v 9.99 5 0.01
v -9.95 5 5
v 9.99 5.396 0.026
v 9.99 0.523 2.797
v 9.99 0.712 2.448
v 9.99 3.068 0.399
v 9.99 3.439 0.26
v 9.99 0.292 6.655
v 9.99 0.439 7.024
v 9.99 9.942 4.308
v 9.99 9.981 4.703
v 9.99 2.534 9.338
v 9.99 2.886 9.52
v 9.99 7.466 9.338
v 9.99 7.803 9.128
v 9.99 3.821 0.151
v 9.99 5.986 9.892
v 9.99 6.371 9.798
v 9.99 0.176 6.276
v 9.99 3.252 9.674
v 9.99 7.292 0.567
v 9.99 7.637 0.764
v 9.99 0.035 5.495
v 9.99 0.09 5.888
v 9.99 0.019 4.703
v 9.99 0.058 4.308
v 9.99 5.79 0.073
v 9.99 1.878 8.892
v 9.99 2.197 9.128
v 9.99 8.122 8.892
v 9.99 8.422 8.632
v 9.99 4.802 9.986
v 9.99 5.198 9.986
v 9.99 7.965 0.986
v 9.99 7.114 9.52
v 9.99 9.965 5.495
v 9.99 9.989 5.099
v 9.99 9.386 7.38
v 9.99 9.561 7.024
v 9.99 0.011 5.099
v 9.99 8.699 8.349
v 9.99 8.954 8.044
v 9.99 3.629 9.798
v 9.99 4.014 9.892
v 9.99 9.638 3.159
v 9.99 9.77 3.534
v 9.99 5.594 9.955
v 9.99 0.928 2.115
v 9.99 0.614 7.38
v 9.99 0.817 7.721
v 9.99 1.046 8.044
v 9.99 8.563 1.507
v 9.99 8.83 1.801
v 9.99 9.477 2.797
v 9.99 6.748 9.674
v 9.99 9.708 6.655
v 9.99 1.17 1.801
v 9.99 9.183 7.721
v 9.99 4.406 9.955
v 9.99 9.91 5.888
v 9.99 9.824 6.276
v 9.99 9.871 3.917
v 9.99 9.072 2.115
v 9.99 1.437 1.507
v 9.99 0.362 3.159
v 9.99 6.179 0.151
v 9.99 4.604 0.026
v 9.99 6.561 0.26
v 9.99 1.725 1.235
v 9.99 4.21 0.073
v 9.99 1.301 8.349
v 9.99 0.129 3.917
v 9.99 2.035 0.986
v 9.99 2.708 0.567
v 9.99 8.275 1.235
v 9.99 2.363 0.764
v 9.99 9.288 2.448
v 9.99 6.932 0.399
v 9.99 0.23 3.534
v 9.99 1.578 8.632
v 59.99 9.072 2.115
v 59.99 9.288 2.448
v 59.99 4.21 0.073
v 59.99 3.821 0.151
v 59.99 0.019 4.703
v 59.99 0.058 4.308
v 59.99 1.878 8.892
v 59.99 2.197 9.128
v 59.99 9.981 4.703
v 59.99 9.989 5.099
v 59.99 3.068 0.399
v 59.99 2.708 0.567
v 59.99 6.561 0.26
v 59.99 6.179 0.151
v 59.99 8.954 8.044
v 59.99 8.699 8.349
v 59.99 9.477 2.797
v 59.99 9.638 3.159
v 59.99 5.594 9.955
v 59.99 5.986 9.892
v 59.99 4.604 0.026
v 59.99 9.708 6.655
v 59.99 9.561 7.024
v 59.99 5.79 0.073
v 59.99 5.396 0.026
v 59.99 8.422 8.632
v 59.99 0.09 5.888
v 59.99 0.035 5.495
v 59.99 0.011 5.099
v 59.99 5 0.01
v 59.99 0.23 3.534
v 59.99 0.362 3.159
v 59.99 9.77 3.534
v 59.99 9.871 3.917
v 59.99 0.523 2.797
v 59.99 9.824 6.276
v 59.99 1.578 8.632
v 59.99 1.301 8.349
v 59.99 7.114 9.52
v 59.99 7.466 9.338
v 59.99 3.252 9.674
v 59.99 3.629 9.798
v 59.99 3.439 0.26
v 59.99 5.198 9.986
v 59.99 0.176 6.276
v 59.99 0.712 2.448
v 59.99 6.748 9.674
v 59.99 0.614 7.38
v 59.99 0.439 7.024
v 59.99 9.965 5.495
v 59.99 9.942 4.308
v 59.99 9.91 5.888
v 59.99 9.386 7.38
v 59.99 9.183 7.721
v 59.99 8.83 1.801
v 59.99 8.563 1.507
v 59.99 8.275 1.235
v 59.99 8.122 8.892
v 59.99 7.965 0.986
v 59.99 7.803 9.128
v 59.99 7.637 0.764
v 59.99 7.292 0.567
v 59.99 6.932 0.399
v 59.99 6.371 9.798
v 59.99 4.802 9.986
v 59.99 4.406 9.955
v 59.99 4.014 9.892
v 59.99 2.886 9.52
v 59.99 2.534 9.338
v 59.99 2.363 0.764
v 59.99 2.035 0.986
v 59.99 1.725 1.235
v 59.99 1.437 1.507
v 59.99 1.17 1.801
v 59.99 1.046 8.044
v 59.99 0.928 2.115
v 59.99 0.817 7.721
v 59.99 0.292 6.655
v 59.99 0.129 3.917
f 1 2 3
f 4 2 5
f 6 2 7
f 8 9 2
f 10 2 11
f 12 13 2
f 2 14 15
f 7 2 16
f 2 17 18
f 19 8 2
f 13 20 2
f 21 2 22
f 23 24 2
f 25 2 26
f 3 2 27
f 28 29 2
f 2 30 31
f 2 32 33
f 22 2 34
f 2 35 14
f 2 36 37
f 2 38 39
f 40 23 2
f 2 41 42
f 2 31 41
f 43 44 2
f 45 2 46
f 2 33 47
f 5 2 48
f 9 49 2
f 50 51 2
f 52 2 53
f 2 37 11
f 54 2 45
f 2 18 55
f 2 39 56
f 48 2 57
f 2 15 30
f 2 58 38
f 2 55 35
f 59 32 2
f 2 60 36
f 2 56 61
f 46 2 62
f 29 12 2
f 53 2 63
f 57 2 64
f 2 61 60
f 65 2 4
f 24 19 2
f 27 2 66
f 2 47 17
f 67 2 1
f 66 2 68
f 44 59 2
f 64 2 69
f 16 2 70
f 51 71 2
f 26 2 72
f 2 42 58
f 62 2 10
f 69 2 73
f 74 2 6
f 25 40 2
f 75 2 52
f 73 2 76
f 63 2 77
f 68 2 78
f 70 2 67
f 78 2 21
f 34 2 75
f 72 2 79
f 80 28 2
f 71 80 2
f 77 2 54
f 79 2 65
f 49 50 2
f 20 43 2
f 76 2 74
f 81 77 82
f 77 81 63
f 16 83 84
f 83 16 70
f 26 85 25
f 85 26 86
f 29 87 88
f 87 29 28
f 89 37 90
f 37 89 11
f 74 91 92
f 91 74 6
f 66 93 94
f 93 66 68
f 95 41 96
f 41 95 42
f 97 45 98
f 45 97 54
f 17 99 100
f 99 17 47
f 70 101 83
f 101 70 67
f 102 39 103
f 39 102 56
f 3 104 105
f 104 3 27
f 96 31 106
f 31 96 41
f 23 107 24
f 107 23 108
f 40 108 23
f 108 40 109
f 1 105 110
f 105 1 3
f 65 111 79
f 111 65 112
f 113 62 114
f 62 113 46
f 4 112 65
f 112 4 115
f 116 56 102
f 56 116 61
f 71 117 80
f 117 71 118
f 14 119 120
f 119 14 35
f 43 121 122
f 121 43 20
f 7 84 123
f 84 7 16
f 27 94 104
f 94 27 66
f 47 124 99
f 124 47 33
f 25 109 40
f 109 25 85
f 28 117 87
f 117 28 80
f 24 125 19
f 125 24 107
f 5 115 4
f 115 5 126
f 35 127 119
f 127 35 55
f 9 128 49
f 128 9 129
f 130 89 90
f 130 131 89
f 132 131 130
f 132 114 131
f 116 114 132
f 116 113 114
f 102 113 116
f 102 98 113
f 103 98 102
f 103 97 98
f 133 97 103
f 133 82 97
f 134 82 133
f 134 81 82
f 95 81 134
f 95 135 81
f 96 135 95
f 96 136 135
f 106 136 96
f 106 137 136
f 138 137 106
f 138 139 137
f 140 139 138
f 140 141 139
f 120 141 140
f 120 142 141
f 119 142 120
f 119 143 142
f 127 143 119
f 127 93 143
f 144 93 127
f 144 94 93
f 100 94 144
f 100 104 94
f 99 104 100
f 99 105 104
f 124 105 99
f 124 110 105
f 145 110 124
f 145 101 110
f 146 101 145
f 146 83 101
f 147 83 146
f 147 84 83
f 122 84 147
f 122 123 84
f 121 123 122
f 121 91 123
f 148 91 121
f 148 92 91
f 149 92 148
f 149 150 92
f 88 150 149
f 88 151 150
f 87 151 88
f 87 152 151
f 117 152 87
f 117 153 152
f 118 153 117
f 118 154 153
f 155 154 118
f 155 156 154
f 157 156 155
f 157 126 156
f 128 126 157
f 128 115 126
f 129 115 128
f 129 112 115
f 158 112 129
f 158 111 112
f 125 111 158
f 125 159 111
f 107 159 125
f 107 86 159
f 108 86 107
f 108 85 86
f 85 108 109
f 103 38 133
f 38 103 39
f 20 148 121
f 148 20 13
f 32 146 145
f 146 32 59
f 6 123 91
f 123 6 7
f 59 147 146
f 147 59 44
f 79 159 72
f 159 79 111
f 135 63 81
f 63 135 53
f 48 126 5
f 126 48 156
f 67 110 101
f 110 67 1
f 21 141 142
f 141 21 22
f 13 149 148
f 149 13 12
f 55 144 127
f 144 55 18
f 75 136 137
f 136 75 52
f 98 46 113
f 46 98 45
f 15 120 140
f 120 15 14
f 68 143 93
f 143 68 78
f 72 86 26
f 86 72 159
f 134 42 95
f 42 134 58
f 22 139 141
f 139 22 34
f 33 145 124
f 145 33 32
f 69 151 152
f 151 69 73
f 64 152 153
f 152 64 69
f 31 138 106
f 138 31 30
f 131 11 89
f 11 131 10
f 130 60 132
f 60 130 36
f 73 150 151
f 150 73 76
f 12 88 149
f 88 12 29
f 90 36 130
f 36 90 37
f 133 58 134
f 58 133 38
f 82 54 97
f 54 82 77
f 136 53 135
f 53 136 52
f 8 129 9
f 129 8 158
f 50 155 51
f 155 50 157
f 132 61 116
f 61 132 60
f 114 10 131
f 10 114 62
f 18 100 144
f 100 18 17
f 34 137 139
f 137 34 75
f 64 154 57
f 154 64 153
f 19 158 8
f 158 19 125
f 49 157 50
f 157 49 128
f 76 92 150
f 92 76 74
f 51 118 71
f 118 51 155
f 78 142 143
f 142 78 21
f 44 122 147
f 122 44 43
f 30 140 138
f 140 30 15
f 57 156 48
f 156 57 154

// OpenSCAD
$fa=1;
$fs=0.4;

module hopper(ht=1000, funnel_h=0.000999, funnel_r=0.000499, orifice_r=0.000249, hopper_center_yz=0.0005) {

    funnel_extension = orifice_r*funnel_h/(funnel_r - orifice_r);
    overlap = 1e-6*funnel_h;

    translate([-funnel_extension, hopper_center_yz, hopper_center_yz]) {
       rotate([0,90,0]) {
          union(){
             cylinder(h = funnel_h + funnel_extension, r1 = 0, r2 = funnel_r, center = false);
             translate([0,0,funnel_h + funnel_extension - overlap]){
                cylinder(h = ht, r = funnel_r, center = false);
             }
          }
       }
    }
}

module exa_hopper(vis_mode=true) {
    if(vis_mode){
        hopper(ht=50, funnel_h=9.99, funnel_r=4.99, orifice_r=2.49, hopper_center_yz=5);
    }
    else {
        difference(){
            ht=1000;
            cube(size=2*(ht+1), center=true);
            hopper(ht=ht, funnel_h=0.000999, funnel_r=0.000499, orifice_r=0.000249, hopper_center_yz=0.0005);
        }
    }
}

exa_hopper(vis_mode=true);
